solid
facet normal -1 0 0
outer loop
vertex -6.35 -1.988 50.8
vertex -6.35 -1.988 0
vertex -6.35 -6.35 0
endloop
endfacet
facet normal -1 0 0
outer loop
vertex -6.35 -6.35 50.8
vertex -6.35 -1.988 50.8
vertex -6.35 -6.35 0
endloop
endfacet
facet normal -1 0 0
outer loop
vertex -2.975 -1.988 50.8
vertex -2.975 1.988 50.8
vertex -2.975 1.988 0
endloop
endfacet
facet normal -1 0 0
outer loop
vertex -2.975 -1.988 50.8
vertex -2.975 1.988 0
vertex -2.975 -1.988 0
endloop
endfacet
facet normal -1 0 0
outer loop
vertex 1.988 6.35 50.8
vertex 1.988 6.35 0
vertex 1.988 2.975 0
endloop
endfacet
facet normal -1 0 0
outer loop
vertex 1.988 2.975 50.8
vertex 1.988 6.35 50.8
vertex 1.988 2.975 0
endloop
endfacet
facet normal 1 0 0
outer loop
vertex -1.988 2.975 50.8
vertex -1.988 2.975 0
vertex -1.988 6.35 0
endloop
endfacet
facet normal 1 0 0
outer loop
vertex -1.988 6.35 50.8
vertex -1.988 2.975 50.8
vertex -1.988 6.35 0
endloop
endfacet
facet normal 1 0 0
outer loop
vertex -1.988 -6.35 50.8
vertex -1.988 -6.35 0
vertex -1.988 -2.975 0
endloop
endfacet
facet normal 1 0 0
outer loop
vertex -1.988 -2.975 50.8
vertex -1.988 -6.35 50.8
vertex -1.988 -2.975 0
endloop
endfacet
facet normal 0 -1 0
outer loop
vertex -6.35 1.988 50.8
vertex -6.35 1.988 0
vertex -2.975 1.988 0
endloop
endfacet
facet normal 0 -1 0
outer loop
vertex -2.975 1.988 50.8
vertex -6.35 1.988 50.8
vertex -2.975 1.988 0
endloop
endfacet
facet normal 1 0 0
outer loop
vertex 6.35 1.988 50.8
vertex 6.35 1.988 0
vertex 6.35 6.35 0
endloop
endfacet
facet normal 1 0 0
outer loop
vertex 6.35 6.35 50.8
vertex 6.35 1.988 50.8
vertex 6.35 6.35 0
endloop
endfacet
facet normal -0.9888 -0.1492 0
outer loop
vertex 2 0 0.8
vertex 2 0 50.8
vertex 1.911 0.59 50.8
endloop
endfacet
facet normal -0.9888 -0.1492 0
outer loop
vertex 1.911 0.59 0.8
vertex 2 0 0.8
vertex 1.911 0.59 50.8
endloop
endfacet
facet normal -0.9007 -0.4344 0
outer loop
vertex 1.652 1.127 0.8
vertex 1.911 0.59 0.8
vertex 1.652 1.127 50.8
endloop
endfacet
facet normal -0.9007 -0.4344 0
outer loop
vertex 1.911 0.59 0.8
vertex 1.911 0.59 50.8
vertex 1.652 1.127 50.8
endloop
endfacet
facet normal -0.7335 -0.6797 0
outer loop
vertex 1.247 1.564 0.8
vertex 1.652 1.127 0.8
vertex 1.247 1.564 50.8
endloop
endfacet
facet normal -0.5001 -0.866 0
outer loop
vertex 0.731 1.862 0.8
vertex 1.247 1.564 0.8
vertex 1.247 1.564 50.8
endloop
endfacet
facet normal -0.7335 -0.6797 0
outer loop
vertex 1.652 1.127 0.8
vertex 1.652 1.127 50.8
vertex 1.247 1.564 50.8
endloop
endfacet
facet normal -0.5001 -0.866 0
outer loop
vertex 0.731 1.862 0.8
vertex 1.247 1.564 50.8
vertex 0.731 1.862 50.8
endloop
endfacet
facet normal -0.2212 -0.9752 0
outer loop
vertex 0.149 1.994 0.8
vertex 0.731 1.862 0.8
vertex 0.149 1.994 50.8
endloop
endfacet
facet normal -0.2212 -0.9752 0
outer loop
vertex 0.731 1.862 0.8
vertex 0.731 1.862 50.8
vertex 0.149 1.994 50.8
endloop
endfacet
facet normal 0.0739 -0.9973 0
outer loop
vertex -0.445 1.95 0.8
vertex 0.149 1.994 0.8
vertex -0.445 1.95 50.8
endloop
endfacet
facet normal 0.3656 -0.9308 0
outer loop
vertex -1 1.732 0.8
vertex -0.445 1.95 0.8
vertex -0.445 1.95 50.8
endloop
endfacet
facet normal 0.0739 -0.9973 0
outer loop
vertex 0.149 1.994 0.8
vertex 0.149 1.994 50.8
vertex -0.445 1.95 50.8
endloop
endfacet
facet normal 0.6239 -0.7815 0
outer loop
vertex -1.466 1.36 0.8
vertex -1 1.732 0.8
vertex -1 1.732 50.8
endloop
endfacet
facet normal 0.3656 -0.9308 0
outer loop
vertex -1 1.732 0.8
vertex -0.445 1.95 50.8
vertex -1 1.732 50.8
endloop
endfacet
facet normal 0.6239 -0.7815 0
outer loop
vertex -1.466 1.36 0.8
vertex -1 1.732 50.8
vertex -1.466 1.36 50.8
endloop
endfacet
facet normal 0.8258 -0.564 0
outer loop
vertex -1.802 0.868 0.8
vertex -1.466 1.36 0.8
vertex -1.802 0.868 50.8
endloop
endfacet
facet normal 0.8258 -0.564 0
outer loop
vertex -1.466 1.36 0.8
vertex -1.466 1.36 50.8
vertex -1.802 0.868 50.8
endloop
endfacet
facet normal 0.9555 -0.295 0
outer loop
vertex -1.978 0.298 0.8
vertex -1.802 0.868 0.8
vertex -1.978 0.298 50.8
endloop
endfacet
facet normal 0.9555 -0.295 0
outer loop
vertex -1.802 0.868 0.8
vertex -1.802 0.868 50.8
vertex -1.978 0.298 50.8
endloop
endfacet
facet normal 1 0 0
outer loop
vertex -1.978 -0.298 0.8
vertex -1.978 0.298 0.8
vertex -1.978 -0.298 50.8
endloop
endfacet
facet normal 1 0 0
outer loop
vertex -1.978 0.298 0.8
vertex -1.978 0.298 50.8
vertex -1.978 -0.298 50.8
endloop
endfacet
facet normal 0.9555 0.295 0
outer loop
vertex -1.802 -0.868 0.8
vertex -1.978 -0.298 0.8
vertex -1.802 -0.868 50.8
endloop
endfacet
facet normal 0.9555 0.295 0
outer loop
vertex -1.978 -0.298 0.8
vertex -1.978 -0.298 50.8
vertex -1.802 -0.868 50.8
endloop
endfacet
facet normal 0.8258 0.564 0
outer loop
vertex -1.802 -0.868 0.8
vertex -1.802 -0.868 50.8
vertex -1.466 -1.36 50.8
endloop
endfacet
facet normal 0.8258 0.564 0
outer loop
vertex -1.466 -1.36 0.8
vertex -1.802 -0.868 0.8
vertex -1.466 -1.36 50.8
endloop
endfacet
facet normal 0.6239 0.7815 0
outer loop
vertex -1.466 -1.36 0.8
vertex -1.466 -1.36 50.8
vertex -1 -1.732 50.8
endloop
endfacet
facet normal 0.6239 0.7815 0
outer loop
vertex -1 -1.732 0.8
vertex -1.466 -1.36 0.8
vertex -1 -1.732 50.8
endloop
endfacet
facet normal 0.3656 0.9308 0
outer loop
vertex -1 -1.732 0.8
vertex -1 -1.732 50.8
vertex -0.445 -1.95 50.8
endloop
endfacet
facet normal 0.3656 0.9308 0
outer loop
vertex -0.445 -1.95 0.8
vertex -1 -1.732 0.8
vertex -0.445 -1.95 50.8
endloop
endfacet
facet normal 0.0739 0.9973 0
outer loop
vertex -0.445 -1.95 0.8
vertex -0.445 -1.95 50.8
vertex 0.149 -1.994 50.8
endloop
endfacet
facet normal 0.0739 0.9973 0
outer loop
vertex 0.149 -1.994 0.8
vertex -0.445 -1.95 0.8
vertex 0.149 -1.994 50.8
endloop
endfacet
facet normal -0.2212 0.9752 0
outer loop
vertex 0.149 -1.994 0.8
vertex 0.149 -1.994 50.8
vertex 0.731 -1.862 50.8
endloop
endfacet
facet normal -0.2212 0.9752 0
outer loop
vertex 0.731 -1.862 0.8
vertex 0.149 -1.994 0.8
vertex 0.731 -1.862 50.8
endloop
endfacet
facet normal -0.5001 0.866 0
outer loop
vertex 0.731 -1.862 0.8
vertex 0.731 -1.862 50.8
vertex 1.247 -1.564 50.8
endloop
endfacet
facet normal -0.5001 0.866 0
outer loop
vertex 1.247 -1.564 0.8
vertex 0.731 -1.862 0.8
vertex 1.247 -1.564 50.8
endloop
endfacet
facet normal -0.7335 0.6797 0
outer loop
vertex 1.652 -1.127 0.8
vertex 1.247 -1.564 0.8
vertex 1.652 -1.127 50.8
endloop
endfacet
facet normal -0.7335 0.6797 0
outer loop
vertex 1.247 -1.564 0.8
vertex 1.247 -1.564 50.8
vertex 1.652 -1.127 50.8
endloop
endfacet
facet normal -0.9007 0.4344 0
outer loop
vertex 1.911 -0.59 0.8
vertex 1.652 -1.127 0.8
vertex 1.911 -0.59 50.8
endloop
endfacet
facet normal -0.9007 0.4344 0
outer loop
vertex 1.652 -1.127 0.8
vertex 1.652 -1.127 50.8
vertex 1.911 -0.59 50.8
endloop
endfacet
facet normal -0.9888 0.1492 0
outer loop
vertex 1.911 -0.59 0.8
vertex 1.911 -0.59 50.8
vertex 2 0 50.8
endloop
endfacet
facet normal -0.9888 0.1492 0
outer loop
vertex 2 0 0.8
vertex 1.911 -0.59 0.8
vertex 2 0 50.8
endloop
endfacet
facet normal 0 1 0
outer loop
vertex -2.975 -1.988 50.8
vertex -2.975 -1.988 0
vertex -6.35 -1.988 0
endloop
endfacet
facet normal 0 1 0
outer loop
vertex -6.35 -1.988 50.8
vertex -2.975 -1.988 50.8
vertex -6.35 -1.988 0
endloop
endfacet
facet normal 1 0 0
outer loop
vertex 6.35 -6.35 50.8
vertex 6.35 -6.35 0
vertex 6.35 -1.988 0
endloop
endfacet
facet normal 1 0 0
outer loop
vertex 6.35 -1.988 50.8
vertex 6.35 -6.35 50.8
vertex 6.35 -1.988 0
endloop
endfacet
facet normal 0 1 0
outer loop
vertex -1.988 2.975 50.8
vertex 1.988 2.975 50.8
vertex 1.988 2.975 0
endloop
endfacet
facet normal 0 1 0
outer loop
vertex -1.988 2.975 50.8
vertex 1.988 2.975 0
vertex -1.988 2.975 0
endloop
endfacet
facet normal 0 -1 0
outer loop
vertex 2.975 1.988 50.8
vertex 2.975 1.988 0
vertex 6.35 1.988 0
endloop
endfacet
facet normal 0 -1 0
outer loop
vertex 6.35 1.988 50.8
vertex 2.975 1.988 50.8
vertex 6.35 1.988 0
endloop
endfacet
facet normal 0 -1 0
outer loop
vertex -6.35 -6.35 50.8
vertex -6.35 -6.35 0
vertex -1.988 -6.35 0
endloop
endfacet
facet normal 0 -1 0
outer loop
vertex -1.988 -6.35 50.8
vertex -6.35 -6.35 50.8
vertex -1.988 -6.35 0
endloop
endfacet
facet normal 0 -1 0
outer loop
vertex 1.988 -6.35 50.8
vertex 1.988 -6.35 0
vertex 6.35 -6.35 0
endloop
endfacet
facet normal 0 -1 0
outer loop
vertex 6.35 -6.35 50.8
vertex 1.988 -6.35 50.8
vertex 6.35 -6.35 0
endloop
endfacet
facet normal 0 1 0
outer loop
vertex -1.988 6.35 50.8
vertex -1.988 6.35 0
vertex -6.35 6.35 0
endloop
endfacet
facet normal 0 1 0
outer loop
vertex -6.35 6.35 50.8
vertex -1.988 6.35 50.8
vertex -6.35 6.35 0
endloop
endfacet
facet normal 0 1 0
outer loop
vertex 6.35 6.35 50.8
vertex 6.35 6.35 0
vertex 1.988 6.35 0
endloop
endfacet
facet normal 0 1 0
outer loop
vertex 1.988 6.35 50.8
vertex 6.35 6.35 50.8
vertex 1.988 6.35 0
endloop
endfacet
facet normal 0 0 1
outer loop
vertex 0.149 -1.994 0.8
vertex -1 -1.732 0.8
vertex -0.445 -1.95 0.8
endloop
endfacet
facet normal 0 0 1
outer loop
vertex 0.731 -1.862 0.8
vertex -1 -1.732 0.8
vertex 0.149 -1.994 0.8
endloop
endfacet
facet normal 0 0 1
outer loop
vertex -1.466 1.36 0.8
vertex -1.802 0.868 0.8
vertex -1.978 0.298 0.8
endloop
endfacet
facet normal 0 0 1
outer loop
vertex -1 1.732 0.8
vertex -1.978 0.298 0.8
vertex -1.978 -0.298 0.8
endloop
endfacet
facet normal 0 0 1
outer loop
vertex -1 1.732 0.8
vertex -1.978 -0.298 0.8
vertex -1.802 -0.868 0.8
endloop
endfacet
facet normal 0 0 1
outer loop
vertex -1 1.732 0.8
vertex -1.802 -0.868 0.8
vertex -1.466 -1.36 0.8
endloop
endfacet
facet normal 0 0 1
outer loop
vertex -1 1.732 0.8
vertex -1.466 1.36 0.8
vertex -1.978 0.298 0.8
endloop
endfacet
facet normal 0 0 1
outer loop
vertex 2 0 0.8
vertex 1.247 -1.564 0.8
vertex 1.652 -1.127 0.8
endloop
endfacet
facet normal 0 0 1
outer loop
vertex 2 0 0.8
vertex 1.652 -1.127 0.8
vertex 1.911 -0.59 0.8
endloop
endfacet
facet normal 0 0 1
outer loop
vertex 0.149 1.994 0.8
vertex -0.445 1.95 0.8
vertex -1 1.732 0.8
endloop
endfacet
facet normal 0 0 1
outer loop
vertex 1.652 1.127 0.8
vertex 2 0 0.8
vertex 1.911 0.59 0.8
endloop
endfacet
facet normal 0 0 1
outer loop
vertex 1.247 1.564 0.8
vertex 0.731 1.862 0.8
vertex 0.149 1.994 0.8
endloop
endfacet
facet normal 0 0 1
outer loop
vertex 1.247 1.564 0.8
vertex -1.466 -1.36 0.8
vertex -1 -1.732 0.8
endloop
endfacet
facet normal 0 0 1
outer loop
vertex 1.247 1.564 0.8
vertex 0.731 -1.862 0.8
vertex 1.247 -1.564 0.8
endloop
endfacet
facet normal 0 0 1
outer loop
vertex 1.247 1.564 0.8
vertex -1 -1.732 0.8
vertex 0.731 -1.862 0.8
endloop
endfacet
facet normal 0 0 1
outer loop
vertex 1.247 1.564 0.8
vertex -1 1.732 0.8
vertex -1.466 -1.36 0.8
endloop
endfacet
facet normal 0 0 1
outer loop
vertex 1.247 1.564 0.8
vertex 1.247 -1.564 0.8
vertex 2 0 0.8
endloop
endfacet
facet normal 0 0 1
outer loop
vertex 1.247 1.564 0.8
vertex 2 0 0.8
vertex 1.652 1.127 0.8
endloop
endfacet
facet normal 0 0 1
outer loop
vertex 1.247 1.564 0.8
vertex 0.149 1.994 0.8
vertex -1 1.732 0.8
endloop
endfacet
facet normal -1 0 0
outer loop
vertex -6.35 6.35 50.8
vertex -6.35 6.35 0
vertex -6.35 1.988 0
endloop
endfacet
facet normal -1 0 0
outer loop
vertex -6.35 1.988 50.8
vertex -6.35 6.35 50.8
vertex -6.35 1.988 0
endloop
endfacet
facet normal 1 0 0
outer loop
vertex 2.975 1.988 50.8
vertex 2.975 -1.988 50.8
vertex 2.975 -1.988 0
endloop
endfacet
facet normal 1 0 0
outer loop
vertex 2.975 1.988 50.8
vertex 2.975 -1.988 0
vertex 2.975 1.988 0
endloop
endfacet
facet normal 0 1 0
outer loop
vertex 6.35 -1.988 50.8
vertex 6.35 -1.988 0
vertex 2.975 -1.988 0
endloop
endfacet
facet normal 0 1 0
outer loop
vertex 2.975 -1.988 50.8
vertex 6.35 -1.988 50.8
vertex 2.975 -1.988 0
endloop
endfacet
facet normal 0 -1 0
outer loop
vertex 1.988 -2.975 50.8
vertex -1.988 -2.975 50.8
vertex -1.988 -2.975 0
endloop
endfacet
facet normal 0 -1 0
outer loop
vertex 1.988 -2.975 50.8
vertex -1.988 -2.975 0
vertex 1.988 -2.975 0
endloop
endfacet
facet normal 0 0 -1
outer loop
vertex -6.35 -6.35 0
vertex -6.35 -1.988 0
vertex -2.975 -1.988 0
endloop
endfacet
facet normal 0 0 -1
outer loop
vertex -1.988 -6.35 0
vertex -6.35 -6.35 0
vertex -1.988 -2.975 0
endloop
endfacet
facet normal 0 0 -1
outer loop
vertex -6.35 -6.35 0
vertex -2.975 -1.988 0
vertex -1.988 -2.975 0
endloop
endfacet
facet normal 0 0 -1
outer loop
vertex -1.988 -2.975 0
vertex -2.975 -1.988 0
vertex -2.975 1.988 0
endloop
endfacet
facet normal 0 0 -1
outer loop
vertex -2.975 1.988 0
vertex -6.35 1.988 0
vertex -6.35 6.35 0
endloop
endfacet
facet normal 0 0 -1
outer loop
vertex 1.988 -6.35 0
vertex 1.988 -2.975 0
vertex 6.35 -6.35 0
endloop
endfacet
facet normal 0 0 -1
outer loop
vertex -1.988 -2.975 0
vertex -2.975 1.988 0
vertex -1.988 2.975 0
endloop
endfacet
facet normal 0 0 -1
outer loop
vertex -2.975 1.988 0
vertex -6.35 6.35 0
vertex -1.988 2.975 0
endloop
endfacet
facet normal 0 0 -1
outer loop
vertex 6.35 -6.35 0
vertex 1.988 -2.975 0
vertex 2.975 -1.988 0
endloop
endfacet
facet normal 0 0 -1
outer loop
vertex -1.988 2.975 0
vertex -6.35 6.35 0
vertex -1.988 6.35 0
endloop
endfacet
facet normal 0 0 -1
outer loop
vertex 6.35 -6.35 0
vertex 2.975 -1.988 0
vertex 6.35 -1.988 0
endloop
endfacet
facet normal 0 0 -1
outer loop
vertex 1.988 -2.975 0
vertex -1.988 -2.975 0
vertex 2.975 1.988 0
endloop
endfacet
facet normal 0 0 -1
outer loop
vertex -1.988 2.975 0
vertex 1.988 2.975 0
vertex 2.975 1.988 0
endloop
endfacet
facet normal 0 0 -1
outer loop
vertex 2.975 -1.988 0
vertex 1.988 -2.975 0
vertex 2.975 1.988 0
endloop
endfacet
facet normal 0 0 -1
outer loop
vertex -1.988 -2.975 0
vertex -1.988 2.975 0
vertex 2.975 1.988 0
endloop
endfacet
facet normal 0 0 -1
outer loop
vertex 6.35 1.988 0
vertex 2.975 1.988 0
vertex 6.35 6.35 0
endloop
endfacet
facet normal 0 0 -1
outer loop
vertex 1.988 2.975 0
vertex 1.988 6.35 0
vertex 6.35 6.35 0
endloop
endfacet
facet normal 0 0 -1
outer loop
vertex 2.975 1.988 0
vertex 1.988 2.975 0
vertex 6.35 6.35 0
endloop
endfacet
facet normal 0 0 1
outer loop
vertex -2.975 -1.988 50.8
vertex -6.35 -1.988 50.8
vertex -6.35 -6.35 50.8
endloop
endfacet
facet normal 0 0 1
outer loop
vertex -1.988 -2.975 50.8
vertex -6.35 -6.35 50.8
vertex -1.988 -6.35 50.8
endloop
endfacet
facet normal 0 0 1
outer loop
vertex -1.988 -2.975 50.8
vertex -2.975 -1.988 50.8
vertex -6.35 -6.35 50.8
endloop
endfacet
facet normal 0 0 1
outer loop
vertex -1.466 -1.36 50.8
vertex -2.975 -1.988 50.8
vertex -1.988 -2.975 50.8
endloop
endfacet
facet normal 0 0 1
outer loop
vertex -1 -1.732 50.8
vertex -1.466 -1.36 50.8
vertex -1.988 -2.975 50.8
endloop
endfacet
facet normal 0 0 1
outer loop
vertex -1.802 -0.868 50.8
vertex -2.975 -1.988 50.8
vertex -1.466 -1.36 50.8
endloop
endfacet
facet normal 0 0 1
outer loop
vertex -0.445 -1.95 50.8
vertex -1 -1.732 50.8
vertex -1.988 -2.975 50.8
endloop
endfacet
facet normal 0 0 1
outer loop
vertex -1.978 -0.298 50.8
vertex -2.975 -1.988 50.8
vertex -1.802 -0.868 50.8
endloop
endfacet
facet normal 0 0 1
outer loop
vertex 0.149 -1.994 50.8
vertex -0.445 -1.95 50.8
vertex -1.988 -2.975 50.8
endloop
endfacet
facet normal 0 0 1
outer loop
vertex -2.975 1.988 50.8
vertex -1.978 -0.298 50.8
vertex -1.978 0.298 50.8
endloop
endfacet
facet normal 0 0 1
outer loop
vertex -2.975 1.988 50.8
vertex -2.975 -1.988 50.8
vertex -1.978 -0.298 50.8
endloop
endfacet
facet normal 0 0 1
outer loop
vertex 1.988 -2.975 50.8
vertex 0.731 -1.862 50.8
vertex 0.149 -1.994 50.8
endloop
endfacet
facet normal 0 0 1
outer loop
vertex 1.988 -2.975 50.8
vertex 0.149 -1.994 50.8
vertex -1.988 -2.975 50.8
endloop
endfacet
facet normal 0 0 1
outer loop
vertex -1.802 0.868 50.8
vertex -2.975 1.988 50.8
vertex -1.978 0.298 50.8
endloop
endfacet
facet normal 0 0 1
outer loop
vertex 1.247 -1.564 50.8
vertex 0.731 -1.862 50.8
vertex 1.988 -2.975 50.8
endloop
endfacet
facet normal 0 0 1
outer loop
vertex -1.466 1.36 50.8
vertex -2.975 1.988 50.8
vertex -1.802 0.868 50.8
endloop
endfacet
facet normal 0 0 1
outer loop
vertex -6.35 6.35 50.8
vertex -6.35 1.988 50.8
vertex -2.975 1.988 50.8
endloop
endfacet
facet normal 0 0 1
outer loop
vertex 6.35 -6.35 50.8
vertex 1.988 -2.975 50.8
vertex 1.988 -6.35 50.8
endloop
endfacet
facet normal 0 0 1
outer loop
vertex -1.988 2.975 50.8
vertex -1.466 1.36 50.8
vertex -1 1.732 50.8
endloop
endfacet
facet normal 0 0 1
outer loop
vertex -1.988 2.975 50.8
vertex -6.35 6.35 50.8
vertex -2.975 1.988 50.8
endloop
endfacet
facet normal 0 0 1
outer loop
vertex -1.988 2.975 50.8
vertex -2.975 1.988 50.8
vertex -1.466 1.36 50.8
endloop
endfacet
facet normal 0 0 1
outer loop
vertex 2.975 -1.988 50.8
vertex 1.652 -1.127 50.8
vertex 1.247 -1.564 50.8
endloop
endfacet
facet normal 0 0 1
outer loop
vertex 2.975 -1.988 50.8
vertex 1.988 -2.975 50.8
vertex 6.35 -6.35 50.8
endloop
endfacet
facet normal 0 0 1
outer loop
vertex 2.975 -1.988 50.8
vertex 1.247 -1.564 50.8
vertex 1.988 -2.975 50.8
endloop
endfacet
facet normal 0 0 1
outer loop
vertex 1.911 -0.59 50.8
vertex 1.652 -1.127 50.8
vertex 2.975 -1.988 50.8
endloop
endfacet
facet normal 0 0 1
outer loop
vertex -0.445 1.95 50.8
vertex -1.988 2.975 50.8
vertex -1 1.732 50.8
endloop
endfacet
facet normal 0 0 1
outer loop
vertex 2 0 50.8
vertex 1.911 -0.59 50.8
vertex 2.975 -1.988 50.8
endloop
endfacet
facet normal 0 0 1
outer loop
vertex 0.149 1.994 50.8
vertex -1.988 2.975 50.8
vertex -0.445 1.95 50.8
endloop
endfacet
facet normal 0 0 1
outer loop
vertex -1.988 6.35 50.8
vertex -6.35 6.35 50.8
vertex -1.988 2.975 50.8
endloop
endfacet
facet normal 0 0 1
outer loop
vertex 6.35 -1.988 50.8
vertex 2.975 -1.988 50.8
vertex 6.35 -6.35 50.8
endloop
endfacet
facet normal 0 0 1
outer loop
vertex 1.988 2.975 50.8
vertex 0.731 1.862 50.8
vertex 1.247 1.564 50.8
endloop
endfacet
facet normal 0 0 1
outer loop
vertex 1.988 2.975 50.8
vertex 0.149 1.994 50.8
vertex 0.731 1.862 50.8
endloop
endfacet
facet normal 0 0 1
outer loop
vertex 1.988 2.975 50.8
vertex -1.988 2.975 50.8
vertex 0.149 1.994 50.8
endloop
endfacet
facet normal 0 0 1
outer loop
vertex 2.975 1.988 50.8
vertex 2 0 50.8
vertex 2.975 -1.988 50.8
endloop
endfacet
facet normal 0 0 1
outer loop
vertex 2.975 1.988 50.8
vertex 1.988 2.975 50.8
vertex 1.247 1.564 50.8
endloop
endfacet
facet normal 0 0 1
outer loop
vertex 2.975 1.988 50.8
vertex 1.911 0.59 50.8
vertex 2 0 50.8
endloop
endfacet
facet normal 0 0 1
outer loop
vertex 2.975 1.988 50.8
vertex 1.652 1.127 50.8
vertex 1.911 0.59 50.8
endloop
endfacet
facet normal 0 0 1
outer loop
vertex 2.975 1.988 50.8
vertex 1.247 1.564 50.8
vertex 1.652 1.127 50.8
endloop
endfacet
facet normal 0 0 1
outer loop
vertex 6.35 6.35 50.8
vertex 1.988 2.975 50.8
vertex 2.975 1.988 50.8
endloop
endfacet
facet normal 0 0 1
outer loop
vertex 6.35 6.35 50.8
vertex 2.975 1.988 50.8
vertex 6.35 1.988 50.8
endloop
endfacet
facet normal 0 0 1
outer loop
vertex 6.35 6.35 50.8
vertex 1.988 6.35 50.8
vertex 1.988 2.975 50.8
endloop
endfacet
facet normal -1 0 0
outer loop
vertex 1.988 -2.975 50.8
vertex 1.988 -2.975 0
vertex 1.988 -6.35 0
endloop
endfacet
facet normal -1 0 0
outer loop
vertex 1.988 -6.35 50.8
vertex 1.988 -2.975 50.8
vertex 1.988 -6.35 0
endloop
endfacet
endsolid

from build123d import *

# Parameters (mm, degrees)
F1_DEPTH = 50.8
F2_R     = 2
F3_DEPTH = 50


with BuildPart() as f1:
    # F0 (on Top) → F1 (new body)
    with BuildSketch(Plane.XY):
        Polygon((-1.9875, 6.35), (-6.35, 6.35), (-6.35, 1.9875), (-2.975, 1.9875), (-2.975, -1.9875), (-6.35, -1.9875), (-6.35, -6.35), (-1.9875, -6.35), (-1.9875, -2.975), (1.9875, -2.975), (1.9875, -6.35), (6.35, -6.35), (6.35, -1.9875), (2.975, -1.9875), (2.975, 1.9875), (6.35, 1.9875), (6.35, 6.35), (1.9875, 6.35), (1.9875, 2.975), (-1.9875, 2.975), align=None)
    extrude(amount=F1_DEPTH)

    # F2 (on face) → F3 (cut)
    with BuildSketch(Plane.XY.offset(50.8)):
        Circle(F2_R)
    extrude(amount=-F3_DEPTH, mode=Mode.SUBTRACT)


solid = f1.part
